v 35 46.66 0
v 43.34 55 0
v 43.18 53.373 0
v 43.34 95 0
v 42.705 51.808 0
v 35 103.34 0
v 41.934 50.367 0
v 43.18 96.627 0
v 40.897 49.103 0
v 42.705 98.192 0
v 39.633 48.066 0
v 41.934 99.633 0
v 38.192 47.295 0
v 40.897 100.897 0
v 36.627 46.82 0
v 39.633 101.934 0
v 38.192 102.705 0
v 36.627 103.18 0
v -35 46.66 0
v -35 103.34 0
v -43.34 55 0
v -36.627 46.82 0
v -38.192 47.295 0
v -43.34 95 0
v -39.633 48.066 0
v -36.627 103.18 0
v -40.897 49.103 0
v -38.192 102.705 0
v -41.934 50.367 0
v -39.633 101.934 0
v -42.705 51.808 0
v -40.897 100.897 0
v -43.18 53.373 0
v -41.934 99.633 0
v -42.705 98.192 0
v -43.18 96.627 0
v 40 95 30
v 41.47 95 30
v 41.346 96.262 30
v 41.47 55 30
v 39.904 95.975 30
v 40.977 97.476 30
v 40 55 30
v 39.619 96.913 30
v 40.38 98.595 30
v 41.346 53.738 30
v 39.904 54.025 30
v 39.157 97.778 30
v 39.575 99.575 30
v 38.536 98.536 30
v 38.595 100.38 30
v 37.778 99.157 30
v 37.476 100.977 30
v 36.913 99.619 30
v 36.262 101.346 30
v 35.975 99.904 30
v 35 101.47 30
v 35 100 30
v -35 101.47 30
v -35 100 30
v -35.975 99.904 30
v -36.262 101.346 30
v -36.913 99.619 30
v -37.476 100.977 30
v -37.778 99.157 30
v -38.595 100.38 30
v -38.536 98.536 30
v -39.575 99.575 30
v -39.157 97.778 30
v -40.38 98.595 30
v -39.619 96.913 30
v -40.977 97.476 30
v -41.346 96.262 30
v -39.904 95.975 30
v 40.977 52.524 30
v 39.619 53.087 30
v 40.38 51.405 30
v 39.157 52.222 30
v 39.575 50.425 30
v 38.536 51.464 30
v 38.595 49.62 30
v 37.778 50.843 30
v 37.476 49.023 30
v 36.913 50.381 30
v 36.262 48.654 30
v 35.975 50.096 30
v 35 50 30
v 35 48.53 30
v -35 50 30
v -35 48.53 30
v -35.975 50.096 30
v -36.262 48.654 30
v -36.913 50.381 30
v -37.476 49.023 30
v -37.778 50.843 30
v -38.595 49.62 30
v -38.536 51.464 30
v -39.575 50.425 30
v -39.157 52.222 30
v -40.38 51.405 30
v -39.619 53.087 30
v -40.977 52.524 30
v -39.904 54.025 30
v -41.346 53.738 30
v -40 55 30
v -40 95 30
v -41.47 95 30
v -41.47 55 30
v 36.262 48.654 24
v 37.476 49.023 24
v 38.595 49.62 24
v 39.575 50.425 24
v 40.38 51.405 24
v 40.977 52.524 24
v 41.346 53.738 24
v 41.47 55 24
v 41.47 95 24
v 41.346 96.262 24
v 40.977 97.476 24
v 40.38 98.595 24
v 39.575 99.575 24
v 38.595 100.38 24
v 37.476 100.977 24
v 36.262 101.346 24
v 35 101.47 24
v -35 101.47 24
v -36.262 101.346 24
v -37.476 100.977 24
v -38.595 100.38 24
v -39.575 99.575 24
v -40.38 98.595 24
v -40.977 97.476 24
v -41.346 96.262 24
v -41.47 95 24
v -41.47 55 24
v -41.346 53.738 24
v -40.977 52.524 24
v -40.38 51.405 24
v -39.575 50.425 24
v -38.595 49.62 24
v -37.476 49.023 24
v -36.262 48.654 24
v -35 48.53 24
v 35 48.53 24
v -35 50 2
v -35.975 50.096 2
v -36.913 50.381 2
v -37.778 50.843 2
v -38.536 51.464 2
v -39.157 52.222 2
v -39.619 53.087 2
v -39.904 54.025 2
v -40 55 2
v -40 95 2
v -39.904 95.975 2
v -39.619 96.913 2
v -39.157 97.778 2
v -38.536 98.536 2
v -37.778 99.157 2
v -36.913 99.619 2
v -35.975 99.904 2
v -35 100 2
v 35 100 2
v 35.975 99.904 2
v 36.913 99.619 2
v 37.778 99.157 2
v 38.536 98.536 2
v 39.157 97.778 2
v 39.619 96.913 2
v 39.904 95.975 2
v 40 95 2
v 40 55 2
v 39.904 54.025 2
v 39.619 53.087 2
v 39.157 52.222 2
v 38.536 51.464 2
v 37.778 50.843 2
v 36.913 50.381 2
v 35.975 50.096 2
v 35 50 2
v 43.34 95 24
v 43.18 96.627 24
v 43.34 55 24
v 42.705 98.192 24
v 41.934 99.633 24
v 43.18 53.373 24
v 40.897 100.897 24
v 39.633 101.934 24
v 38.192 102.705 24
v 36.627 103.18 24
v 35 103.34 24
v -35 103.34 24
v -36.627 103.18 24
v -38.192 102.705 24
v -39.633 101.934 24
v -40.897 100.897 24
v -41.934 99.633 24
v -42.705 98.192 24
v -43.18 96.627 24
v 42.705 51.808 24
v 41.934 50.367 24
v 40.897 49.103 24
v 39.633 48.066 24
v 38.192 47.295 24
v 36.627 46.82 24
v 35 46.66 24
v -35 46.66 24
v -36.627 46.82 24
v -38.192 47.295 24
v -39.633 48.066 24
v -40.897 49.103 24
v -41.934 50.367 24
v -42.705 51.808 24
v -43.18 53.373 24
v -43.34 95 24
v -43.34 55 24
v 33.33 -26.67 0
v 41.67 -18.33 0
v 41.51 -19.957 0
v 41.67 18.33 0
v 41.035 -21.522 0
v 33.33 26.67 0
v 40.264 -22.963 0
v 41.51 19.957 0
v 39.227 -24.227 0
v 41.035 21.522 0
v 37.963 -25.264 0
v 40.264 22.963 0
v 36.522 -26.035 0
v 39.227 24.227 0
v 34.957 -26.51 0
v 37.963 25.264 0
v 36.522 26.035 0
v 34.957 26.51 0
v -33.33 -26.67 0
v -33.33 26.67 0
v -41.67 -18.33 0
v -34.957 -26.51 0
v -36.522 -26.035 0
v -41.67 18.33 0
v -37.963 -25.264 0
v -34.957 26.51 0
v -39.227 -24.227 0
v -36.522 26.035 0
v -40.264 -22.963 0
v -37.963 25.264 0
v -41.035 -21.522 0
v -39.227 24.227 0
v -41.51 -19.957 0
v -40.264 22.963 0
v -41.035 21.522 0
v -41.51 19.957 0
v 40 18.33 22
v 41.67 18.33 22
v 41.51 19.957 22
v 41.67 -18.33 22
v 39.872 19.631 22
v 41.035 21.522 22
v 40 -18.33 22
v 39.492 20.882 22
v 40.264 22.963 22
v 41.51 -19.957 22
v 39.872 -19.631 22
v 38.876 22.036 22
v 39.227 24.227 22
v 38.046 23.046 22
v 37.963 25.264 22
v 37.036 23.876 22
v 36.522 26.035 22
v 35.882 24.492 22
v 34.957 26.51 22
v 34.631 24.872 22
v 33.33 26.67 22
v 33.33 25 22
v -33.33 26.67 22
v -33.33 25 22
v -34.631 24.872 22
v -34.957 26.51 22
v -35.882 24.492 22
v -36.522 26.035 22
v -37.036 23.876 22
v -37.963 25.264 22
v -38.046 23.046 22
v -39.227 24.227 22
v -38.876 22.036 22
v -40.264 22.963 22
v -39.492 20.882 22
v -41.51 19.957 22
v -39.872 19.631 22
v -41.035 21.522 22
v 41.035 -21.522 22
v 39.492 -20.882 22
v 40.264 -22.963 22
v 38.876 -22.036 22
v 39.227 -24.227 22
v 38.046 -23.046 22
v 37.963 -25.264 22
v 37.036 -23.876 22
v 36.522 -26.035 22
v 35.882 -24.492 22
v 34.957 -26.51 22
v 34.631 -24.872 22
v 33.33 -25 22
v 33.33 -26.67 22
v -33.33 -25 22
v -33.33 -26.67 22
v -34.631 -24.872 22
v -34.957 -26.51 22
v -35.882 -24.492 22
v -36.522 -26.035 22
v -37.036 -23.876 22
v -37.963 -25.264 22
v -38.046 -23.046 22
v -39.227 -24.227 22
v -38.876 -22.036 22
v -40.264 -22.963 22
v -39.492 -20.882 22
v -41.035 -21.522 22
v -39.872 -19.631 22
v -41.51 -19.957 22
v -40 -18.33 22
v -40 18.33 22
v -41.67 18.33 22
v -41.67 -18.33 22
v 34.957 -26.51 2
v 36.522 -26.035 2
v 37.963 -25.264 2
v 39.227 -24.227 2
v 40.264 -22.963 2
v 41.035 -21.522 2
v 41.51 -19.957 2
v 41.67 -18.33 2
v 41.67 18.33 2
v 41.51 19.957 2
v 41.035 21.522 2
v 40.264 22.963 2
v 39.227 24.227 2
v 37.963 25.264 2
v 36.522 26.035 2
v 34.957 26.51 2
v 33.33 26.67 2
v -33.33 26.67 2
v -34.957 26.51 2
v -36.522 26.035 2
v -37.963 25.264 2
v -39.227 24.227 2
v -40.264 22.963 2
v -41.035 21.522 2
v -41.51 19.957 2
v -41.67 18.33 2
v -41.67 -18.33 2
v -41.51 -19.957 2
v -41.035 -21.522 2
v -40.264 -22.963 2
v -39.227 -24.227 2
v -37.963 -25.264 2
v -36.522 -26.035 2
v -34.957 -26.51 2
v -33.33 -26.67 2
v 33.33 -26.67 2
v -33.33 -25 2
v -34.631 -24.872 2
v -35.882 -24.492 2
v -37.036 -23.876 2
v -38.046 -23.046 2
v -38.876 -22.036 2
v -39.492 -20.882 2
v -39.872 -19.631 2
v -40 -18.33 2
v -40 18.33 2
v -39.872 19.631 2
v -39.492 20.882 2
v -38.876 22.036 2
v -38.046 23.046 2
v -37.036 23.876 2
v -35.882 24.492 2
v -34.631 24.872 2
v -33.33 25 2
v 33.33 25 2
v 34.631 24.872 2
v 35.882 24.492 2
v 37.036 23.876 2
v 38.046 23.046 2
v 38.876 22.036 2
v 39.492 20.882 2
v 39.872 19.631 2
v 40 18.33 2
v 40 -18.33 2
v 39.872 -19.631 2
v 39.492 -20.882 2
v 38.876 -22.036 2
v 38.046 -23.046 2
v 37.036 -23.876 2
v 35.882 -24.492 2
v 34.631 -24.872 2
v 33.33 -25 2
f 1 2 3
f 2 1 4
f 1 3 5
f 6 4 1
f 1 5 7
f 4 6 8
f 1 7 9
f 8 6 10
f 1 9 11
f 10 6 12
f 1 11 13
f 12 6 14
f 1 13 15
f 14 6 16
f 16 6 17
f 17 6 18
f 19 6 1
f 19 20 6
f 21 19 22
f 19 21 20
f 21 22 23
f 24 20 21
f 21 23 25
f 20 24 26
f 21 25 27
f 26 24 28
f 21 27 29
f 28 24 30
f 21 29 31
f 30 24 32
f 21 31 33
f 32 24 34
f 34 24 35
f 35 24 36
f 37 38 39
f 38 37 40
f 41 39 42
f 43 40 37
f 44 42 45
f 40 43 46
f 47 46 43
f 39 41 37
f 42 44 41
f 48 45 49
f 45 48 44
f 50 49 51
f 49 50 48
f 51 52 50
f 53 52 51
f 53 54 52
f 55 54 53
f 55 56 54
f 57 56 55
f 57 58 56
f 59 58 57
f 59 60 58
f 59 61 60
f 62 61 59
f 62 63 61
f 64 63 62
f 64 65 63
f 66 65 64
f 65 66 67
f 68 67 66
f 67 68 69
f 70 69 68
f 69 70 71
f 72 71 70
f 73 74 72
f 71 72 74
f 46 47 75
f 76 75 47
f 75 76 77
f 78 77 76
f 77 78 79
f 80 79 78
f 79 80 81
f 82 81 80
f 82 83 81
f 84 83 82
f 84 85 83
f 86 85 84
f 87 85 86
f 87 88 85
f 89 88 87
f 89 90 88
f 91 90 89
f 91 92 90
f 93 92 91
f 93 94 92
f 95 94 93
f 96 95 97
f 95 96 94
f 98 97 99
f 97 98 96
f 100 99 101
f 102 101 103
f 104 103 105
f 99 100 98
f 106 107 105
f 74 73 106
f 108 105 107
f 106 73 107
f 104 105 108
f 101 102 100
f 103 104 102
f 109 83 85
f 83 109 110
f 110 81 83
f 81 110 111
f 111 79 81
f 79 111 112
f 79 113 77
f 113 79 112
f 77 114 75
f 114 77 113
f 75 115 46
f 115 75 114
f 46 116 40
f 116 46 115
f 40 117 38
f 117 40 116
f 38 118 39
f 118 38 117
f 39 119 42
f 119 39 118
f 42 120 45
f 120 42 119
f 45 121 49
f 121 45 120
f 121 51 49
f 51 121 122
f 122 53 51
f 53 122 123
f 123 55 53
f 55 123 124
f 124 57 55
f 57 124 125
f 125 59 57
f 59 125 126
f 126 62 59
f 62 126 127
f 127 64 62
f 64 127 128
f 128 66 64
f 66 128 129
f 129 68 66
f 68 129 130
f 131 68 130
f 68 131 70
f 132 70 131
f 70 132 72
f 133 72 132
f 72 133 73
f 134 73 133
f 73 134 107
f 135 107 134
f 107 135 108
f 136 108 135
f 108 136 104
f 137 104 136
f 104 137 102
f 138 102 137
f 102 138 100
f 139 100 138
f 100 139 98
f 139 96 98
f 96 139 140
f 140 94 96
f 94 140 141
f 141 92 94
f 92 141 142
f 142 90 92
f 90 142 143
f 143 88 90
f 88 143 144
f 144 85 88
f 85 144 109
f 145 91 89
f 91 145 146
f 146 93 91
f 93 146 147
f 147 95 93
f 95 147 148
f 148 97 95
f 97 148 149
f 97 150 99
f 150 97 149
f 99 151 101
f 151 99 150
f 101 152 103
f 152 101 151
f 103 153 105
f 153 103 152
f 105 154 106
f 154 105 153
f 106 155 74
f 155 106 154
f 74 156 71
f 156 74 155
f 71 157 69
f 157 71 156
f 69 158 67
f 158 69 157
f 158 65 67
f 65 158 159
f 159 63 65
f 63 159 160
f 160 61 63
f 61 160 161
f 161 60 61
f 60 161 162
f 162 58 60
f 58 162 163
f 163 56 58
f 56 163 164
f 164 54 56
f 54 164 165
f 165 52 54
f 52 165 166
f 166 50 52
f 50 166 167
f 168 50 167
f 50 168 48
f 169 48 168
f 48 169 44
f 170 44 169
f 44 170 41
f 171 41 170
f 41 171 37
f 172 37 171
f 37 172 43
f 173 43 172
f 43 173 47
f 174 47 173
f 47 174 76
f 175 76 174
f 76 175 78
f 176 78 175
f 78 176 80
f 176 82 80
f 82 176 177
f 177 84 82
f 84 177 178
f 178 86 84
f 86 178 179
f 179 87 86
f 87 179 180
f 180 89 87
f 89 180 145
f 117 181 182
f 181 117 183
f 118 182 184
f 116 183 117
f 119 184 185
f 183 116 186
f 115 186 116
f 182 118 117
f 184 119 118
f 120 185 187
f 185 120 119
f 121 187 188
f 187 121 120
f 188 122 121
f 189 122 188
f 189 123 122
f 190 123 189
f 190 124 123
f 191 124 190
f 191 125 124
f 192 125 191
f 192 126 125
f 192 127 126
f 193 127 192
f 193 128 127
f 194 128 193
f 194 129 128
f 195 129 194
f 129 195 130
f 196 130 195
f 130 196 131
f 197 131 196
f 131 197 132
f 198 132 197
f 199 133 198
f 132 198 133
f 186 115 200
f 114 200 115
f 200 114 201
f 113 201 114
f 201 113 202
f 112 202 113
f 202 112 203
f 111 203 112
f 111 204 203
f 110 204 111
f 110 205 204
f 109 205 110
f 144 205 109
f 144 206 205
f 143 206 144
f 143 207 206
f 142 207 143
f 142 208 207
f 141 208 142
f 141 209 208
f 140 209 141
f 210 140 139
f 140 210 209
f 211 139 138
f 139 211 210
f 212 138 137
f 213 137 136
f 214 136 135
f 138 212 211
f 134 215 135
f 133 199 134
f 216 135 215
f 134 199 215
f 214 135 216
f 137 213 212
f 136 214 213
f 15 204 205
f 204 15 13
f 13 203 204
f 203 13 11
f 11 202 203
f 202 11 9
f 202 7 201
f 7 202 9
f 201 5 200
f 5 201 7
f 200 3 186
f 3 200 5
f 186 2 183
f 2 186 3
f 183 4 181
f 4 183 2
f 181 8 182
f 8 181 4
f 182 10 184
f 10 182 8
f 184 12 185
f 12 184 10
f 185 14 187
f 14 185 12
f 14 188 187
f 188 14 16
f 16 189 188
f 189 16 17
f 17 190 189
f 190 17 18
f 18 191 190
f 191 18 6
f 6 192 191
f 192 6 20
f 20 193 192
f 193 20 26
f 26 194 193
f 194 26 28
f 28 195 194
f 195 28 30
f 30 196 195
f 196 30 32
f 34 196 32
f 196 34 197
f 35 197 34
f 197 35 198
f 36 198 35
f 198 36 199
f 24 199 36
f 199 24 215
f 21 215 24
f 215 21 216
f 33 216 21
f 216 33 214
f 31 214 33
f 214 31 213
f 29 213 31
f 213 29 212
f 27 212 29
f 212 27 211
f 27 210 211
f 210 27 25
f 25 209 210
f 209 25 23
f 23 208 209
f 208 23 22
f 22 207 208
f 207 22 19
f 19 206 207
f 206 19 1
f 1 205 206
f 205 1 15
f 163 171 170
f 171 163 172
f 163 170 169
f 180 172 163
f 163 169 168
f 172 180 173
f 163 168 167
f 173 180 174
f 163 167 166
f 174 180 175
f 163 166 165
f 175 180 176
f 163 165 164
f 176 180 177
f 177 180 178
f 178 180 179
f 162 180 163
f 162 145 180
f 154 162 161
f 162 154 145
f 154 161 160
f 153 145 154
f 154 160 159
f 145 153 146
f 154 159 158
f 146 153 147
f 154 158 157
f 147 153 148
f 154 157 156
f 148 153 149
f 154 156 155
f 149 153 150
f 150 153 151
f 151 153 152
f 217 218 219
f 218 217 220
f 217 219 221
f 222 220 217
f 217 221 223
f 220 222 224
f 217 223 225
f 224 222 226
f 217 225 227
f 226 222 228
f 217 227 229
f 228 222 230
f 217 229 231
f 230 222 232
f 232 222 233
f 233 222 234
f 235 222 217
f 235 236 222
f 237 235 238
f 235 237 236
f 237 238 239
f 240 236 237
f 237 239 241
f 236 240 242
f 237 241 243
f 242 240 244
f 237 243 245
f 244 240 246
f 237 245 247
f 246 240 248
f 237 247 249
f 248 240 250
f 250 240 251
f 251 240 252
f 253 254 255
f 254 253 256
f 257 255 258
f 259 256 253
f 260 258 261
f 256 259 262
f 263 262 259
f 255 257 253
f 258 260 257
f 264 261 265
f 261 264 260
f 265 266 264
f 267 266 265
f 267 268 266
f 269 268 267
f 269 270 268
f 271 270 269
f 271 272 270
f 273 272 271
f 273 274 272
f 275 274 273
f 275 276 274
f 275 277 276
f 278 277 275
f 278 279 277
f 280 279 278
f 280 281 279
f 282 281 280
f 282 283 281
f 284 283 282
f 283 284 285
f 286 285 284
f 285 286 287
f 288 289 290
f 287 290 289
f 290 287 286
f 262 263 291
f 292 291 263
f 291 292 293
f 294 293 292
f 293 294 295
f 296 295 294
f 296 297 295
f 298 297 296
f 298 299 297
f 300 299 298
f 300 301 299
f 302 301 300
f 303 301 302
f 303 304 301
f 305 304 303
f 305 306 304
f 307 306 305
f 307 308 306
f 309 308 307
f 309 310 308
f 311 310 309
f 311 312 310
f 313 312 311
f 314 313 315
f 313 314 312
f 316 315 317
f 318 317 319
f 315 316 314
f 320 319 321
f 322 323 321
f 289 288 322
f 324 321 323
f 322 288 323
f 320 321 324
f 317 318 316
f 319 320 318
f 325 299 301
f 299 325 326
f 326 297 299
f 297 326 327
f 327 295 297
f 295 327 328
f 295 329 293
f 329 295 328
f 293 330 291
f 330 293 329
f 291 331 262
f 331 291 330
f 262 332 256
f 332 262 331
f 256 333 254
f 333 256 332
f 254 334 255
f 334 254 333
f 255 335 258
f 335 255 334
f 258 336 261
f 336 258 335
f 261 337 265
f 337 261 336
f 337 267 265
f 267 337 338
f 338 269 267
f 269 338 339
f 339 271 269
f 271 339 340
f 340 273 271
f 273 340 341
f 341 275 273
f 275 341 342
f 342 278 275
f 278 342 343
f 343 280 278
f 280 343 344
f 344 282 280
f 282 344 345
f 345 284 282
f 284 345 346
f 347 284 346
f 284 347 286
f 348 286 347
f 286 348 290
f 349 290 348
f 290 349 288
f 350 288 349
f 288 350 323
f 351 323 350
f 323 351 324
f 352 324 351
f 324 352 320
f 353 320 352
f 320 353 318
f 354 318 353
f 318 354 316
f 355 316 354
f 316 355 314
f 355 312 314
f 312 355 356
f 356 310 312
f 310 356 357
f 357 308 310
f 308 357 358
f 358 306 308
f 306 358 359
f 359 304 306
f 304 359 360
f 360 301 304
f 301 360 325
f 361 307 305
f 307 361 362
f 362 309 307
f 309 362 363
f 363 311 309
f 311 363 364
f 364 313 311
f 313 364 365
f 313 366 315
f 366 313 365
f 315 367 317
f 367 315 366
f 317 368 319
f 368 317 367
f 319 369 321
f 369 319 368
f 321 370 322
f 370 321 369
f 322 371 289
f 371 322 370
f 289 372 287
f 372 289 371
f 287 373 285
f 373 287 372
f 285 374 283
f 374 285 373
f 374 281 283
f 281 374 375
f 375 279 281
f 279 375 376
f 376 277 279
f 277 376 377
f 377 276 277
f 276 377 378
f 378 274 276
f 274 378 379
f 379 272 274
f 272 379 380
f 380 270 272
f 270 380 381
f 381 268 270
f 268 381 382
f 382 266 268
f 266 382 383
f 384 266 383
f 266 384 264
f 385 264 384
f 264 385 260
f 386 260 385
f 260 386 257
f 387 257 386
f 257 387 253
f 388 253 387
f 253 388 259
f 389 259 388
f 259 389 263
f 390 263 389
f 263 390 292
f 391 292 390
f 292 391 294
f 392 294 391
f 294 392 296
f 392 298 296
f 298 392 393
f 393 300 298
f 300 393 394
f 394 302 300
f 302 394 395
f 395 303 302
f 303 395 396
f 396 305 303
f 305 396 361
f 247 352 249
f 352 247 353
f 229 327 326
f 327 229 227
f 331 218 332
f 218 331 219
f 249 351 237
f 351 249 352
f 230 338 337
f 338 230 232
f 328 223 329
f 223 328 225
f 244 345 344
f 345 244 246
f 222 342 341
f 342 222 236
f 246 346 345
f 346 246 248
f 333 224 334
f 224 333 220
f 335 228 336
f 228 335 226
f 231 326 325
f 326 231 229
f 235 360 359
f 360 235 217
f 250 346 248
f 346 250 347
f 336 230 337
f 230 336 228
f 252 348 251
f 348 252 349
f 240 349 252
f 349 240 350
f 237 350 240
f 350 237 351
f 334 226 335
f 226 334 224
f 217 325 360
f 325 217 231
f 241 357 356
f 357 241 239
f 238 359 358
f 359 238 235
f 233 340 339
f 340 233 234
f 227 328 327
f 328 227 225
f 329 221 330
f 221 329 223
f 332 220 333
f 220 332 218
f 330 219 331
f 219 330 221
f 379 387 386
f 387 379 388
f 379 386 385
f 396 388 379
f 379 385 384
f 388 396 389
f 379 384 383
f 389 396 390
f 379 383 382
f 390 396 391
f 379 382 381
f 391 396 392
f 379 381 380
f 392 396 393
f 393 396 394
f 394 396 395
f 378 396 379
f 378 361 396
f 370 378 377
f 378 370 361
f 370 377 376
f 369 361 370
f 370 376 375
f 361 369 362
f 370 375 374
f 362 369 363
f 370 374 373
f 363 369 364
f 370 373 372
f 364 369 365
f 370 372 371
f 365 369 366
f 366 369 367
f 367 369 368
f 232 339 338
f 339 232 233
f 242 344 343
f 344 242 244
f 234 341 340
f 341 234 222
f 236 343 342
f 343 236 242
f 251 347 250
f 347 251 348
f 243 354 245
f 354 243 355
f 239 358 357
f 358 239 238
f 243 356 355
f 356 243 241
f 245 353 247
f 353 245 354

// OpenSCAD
// file: ../A2D.scad
/****************************************************************************
 * Altair's 2D Objects for OpenSCAD              version 1.0.0 (2020-02-20) *
 * Copyright (c) Michal A. Valasek, 2020                                    *
 * ------------------------------------------------------------------------ *
 * www.rider.cz * www.altair.blog * github.com/ridercz/A2D                  *
 ****************************************************************************/

// Constants
a2d_version = [1, 0, 0];    // Version of a2d library [major, minor, revision]
pi = PI;                    // Pi value
phi = (1 + sqrt(5)) / 2;    // Golden ratio

/** POINT GENERATORS **/

// Generates points of vertices of regular polygon, given outer diameter and number of vertices, centered on origin
function regpoly_points(od, vertices) =
    assert(od > 0)
    assert(vertices > 1)
    [for(a = [0 : 360 / vertices : 359]) vector_point(a+90, od / 2)];

// Generates points of vertices of a rectangle ("square" in OpenSCAD terminology), given its size in [x, y]
function square_points(size, center = false) = 
    assert(is_list(size) && len(size) == 2)
    center 
        ? translate_points(square_points(size, false), size / -2)
        : [[0, 0], [size[0], 0], size, [0, size[1]]];

// Generates points of vertices of a star, given number of star points, outer diameter and inner diameter, centered on origin
function star_points(n, od, id) = 
    assert(n > 2)
    assert(od > id)
    assert(id > 0)
    [for(a = [0 : 360 / n : 359]) each([vector_point(a, od / 2), vector_point(a + 180 / n, id / 2)])];

/** SHAPES - STARS **/

// Creates a perfect five-pointed star of given outer diameter, centered on origin
module p5star(od) {
    assert(od > 0);

    id = od * (2 - phi);
    star(5, od,  id);
}

// Creates a perfect six-pointed star of given outer diameter, centered on origin
module p6star(od) {
    assert(od > 0);

    rotate(30) circle(d = od, $fn = 3);
    rotate(90) circle(d = od, $fn = 3);
}

// Creates a regular star of given number of points and outer and inner diameter, centered on origin
module star(n, od, id) {
    assert(n > 2);
    assert(od > id);
    assert(id > 0);

    polygon(star_points(n, od, id));
}

/** SHAPES - ROUNDED **/

// Creates a regular polygon with given outer diameter, number of vertices and vertex radius, centered on origin
module r_regpoly(od, vertices, radius) {
    // Validate arguments
    assert(od > 0);
    assert(vertices > 1);
    assert(radius >= 0);
    
    if(radius == 0) {
        circle(d = od, $fn = vertices);
    } else {
        hull() for(pos = regpoly_points(od - 2 * radius, vertices) ) translate(pos) circle(r = radius);
    }
}

// Creates a rectangle with given size and corner radius. Size may be specified:
// - as a scalar number, the same for all corners
// - as a list with two items, for top and bottom radii
// - as a list with four items, for all corners, starting with left bottom counterclockwise
module r_square(size, radius, center = false) {
    // Validate arguments
    assert(is_list(size) && len(size) == 2);
    assert(is_num(radius) || (is_list(radius) && len(radius) == 2) || len(radius) == 4);

    if(is_num(radius)) {
        // The same radius on all corners
        r_square(size, [radius, radius, radius, radius], center);
    } else if(len(radius) == 2) {
        // Different radii on top and bottom
        r_square(size, [radius[0], radius[0], radius[1], radius[1]], center);
    } else if(len(radius) == 4) {
        // Different radius on different corners
        translate(center ? [size[0] / -2, size[1] / -2] : [0, 0]) hull() {
            // BL
            if(radius[0] <= 0) square([1, 1]);
            else translate([radius[0], radius[0]]) circle(r = radius[0]);
            // BR
            if(radius[1] <= 0) translate([size[0] - 1, 0]) square([1, 1]);
            else translate([size[0] - radius[1], radius[1]]) circle(r = radius[1]);
            // TR
            if(radius[2] <= 0) translate([size[0] - 1, size[1] - 1]) square([1, 1]);
            else translate([size[0] - radius[2], size[1] - radius[2]]) circle(r = radius[2]);
            // TL
            if(radius[3] <= 0) translate([0, size[1] - 1]) square([1, 1]);
            else translate([radius[3], size[1] - radius[3]]) circle(r = radius[3]);
        }
    } else {
        // This code should be unreachable
        assert(false);
    }
}

/** SHAPES - HOLLOW **/

// Hollow circle (ring) with given wall thickness; use $fn to create hollow regular polygon
module h_circle(d, thickness) {
    assert(d > 0);
    assert(thickness != 0);

    difference() {
        circle(d = a2d_outer(d, thickness));
        circle(d = a2d_inner(d, thickness));
    }
}

// Hollow rectangle ("square" in OpenSCAD terminology) with given wall thickness
module h_square(size, thickness, center = false) {
    assert(thickness != 0);

    translate(center ? [0, 0] : [a2d_outer(size[0], thickness) / 2, a2d_outer(size[1], thickness) / 2])
        difference() {
            square([a2d_outer(size[0], thickness), a2d_outer(size[1], thickness)], center = true);
            square([a2d_inner(size[0], thickness), a2d_inner(size[1], thickness)], center = true);
        }
}

/** SHAPES - HOLLOW AND ROUNDED **/

// Hollow and rounded regular polygon
module hr_regpoly(od, vertices, radius, thickness) {
    rh_regpoly(od, vertices, radius, thickness);
}
module rh_regpoly(od, vertices, radius, thickness) {
    assert(od > 0);
    assert(vertices > 1);
    assert(radius >= 0);
    assert(thickness != 0);

    difference() {
        r_regpoly(a2d_outer(od, thickness), vertices, a2d_outer(radius, thickness, 1));
        r_regpoly(a2d_inner(od, thickness), vertices, a2d_inner(radius, thickness, 1));
    }
}

// Hollow and rounded rectangle ("square" in OpenSCAD terminology)
module hr_square(size, radius, thickness, center = false) {
    rh_square(size, radius, thickness, center);
}
module rh_square(size, radius, thickness, center = false) {
    // Validate arguments
    assert(is_list(size) && len(size) == 2);
    assert(is_num(radius) || (is_list(radius) && len(radius) == 2) || len(radius) == 4);
    assert(thickness != 0);

    translate(center ? [0, 0] : [a2d_outer(size[0], thickness) / 2, a2d_outer(size[1], thickness) / 2])
        difference() {
            r_square([a2d_outer(size[0], thickness), a2d_outer(size[1], thickness)], a2d_outer(radius, thickness, factor = 1), center = true);
            r_square([a2d_inner(size[0], thickness), a2d_inner(size[1], thickness)], a2d_inner(radius, thickness, factor = 1), center = true);
        }
}

/** FUNCTIONS **/

// Gets ciscumscribed circle diameter from given inscribed circle diameter for a regular polygon
function ins2cir(ri, n) = 
    assert(ri > 0)
    assert(n > 2)
    ri * tan(180 / n) / sin(180 / n);

// Gets inscribed circle diameter from given curcumscribed circle diameter for a regular polygon
function cir2ins(rc, n) =
    assert(rc > 0)
    assert(n > 0)
    rc * sin(180 / n) / tan(180 / n);

// Returns point (coordinates) for a given angle (alpha) and distance); follows left hand rule
function vector_point(alpha, delta) = [sin(alpha) * delta, cos(alpha) * delta];

// Will offset a list of points by given offset each
function translate_points(points, offset) = [for(p = points) p + offset];

// Private helper functions

function a2d_outer(d, thickness, factor = 2) = 
    assert(thickness != 0) 
    assert(factor > 0)
    is_list(d) 
        ? [for(x = d) a2d_outer(x, thickness, factor)] 
        : (thickness > 0 ? d + factor * thickness : d);

function a2d_inner(d, thickness, factor = 2) = 
    assert(thickness != 0)
    assert(factor > 0)
    is_list(d) 
        ? [for(x = d) a2d_inner(x, thickness, factor)] 
        : (thickness > 0 ? d : d + factor * thickness);
// main file
/****************************************************************************
 * Parametric Box with Lid - sample for A2D OpenSCAD Library                *
 * Copyright (c) Michal A. Valasek, 2020                                    *
 * www.rider.cz * www.altair.blog * github.com/ridercz/A2D                  *
 * ------------------------------------------------------------------------ *
 * This sample is intended to showcase how the r_square and rh_square       *
 * modules are supposed to work.                                            *
 ****************************************************************************/

include <../A2D.scad>

/* [Dimensions] */

// Inner box dimensions
inner_size = [80, 50, 40];

// Outer radius
radius = 5;

// Outside height of top lid
lid_height = 20;

/* [Details] */
// Vertical wall thickness, should be even number of perimeters
vwt = 1.67;

// Horizontal wall thickness
hwt = 2;

// Height of lid lip
lip_height = 6;

lid_tolerance = .2;

/* [Hidden] */
X = 0; Y = 1; Z = 2;
$fudge = 1;
$fn = 32;

outer_size = [
    inner_size[X] + 2 * vwt,
    inner_size[Y] + 2 * vwt,
    inner_size[Z] + 2 * hwt,
];
outer_bottom_height = outer_size[Z] - lid_height;

/** Render **/

translate([0, inner_size[Y] * 1.5]) part_box();
part_lid();

/** Parts **/

module part_lid() {
    // Walls
    linear_extrude(lid_height + hwt) rh_square([outer_size[X], outer_size[Y]], radius + vwt * 2, -vwt, center = true);

    // Bottom plate
    linear_extrude(hwt) r_square([outer_size[X], outer_size[Y]], radius + vwt * 2, center = true);
}

module part_box() {
    // Lip
    linear_extrude(outer_bottom_height + lip_height) 
    rh_square([inner_size[X], inner_size[Y]], radius, vwt - lid_tolerance, center = true);

    // Walls
    linear_extrude(outer_bottom_height) 
    rh_square([inner_size[X], inner_size[Y]], radius, vwt * 2, center = true);

    // Bottom plate
    linear_extrude(hwt) 
    r_square([outer_size[X], outer_size[Y]], radius + vwt * 2, center = true);
}
